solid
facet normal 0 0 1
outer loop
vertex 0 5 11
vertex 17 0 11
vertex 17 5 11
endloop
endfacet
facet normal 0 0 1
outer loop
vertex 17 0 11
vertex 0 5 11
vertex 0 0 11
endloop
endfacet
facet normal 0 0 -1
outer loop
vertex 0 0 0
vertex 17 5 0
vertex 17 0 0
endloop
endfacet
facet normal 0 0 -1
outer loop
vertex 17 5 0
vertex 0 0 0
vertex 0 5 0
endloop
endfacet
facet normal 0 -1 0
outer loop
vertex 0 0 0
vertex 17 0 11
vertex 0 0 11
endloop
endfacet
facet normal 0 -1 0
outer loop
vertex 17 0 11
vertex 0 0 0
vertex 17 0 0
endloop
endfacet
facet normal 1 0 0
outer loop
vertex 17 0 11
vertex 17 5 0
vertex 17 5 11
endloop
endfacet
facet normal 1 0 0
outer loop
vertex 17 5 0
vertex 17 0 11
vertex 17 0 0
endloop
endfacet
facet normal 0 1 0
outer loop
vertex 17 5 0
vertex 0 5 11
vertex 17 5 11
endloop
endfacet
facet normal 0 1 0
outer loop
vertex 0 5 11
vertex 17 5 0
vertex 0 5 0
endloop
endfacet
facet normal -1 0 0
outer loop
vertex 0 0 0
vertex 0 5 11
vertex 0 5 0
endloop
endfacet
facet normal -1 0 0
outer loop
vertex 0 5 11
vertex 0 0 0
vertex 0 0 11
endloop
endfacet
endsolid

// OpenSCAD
// Generated by SolidPython 1.0.1 on 2020-07-29 00:46:56


cube(size = [17, 5, 11]);
/***********************************************
*********      SolidPython code:      **********
************************************************
 
# import packages: SolidPython
from solid import *
from solid.utils import *
from itertools import chain, combinations, permutations


class Resize:

    def __init__(self, scad_file):
        self.scad_file = scad_file
        #self.scad_file = import_scad(scad_file)
        # cone/cylinder param:
        self.r1 = 0
        self.r2 = 0
        self.h = 0
        # rectangular prism param:
        self.w = 0
        self.l = 0
        # ellipse param:
        self.r = 0

    # import OpenScad code (file name corresponds to shape)


    # classify shape + parameters
    def assign(self, param1, param2, param3):
        if self.scad_file == 'cone.scad':
            self.r1 = param1
            self.r2 = param2
            self.h = param3
        elif self.scad_file == 'cylinder.scad':
            self.r1 = param1
            self.r2 = param2
            self.h = param3
        elif self.scad_file == 'rectangularPrism.scad':
            self.h = param1
            self.l = param2
            self.w = param3
        else:
            self.r = param1
            self.h = param2

    # resize parameters
    def iterate(self):
        x = range(3, 20, 2)
        i = 1
        if self.scad_file == 'cone.scad':
            tempList = list(permutations(x, 2))
            for temp in tempList:
                param1 = temp[0]
                param2 = temp[1]
                filepath = 'produced_scad_files/' + 'cone' + str(param1) + '_' + str(param2) + '_' + '.scad'
                scad_render_to_file(cylinder(h=param1, r1=param2, r2=0), filepath)

        elif self.scad_file == 'cylinder.scad':
            tempList = list(permutations(x, 3))
            for temp in tempList:
                param1 = temp[0]
                param2 = temp[1]
                filepath = 'produced_scad_files/' + 'cylinder' + str(param1) + '_' + str(param2) + '_' + '.scad'
                scad_render_to_file(cylinder(h=param1, r1=param2, r2=param2), filepath)

        elif self.scad_file == 'rectangularPrism.scad':
            tempList = list(permutations(x, 3))
            for temp in tempList:
                param1 = temp[0]
                param2 = temp[1]
                param3 = temp[2]
                filepath = 'produced_scad_files/' + 'rectangularPrism' + str(param1) + '_' + str(param2) + '_' + str(
                    param3) + '.scad'
                scad_render_to_file(cube(size=(param1, param2, param3)), filepath)

        elif self.scad_file == 'ellipse.scad':
            tempList = list(permutations(x, 4))
            for temp in tempList:
                param1 = temp[0]
                param2 = temp[1]
                param3 = temp[2]
                param4 = temp[3]
                filepath = 'produced_scad_files/' + 'ellipse' + str(param1) + '_' + str(param2) + '_' + str(param3) + '_' + str(param4) + '.scad'
                scad_render_to_file(scale([param1, param2, param3])(sphere(r=param4)), filepath)

    def render_to_scadfile(self):
        scad_render_to_file(scad, 'example.scad') 
 
************************************************/
